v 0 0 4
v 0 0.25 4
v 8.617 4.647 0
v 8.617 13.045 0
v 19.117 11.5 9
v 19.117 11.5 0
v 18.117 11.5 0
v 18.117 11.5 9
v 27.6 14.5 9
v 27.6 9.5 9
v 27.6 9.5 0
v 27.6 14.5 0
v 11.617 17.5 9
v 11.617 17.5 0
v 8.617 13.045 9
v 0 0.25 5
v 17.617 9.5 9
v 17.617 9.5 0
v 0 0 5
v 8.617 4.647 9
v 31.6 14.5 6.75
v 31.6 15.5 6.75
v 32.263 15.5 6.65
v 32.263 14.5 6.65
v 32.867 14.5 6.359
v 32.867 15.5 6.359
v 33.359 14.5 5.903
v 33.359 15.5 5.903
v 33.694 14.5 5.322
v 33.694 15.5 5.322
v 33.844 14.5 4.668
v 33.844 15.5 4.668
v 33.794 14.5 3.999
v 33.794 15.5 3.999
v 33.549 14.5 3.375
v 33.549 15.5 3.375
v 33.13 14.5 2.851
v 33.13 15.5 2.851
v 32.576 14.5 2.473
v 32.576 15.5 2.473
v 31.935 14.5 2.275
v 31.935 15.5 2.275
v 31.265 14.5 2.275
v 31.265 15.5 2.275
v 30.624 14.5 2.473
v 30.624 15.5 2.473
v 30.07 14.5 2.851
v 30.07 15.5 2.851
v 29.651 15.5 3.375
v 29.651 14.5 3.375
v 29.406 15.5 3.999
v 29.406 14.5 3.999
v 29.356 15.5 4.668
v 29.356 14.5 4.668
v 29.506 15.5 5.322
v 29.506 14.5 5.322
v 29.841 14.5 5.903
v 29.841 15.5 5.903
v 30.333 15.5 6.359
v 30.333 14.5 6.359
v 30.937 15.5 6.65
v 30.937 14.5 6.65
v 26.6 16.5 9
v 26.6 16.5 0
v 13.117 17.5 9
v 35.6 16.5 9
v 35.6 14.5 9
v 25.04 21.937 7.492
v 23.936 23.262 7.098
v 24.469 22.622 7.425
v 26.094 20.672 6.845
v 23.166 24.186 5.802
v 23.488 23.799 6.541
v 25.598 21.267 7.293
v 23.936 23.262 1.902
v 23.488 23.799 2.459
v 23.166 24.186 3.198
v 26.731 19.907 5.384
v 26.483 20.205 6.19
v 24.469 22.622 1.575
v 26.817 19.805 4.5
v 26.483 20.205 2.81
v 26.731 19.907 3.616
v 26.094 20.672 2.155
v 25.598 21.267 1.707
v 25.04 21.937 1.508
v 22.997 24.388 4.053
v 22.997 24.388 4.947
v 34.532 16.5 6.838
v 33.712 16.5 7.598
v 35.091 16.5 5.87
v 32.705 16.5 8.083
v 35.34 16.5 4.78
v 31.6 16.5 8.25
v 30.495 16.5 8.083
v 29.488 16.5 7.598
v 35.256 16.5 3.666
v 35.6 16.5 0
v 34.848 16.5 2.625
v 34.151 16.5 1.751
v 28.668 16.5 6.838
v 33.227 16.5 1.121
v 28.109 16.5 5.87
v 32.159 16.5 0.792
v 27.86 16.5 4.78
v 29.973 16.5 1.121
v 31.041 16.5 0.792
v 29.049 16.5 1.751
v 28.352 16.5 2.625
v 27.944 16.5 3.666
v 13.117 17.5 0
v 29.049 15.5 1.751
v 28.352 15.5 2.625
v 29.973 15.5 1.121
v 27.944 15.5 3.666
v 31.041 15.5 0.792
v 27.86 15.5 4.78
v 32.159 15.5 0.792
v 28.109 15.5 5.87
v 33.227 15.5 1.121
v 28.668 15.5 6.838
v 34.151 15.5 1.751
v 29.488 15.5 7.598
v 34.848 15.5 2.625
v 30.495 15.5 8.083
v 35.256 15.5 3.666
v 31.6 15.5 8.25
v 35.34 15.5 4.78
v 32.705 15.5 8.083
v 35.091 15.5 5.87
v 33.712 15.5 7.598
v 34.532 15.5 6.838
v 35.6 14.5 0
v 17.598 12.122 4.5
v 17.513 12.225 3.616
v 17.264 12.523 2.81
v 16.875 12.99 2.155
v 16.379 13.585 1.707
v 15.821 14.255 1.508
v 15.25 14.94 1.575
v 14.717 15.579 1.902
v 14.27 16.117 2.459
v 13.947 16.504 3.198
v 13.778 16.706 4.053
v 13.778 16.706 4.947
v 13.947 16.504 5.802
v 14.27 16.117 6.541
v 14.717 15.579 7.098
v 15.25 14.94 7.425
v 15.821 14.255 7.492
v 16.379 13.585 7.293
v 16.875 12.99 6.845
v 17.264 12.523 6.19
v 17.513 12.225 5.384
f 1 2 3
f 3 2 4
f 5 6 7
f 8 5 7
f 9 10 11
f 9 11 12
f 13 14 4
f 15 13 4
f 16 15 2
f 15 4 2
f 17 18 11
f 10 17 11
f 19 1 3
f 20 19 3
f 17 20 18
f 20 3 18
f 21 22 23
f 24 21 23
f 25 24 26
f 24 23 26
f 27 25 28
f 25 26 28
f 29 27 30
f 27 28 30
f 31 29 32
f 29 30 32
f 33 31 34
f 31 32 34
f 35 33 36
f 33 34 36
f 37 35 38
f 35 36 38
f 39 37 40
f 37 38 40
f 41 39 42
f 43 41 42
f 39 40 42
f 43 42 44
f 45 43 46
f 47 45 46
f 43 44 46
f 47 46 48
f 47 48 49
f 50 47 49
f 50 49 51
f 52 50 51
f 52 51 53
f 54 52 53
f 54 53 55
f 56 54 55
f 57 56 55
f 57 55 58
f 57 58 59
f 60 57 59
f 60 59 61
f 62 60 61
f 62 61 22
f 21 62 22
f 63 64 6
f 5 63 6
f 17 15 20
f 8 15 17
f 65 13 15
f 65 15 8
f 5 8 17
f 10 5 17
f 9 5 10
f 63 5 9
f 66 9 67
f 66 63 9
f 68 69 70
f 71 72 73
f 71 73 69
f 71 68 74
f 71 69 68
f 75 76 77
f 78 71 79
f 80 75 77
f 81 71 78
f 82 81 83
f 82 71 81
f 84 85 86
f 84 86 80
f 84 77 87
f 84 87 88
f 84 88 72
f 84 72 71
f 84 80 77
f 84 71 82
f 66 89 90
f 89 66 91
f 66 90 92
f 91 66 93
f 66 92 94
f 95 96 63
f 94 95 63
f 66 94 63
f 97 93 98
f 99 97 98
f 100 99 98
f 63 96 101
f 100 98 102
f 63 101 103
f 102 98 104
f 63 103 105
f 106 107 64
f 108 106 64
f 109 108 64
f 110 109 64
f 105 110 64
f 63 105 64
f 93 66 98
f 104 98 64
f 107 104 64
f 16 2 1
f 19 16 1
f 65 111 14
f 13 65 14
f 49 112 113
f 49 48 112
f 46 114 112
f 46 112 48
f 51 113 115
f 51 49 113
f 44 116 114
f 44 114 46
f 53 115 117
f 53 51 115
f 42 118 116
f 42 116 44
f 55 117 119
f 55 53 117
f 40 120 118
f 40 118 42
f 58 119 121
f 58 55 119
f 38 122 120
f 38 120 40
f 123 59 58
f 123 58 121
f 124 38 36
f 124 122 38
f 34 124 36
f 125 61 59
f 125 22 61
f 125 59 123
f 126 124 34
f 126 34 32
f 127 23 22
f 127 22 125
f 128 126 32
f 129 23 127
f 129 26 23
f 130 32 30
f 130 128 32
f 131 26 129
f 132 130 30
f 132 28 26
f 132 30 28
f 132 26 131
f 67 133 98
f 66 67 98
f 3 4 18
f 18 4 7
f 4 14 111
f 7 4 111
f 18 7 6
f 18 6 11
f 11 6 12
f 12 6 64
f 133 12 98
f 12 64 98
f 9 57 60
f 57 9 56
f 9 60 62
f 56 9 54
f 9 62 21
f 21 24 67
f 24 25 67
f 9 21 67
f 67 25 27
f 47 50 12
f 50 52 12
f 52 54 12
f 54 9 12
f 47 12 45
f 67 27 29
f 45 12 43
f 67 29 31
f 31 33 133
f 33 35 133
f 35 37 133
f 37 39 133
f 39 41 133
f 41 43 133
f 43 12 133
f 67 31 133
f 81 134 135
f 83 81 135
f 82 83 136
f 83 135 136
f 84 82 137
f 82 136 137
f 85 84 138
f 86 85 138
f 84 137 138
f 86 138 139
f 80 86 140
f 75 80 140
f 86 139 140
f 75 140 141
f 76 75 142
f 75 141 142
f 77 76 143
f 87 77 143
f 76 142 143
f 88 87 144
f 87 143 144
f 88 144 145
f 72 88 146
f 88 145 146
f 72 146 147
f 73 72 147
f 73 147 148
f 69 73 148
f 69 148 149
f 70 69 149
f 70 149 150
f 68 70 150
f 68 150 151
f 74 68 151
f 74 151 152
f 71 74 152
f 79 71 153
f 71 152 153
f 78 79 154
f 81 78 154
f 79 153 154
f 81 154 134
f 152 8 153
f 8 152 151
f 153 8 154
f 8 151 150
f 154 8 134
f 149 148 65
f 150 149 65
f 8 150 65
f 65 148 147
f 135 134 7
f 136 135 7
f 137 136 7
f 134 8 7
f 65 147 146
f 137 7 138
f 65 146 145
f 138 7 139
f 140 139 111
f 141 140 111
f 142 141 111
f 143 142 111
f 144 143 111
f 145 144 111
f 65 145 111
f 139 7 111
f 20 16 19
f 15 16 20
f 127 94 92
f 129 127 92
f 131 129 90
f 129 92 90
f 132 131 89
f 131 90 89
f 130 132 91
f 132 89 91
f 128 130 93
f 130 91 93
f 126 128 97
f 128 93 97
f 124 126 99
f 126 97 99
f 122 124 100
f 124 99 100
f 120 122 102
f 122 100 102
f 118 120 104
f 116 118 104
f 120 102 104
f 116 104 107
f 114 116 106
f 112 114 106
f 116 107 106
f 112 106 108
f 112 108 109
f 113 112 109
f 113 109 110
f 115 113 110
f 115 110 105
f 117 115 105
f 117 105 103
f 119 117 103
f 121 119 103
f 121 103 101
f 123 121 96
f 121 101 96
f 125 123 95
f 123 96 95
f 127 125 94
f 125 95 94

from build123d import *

# Parameters (mm, degrees)
BOSS_EXTRUDE1_DEPTH = 9
SKETCH2_R           = 2.25
CUT_EXTRUDE1_DEPTH  = 16.5
SKETCH2_3_R         = 3.75
SKETCH2_3_R_2       = 2.25
CUT_EXTRUDE2_DEPTH  = 1
SKETCH3_R           = 3
BOSS_EXTRUDE2_DEPTH = 12


with BuildPart() as part:
    # Sketch1 → Boss-Extrude1 (new body)
    with BuildSketch(Plane.XY):
        Polygon((0, 0), (17.616685226, 9.5), (27.6, 9.5), (27.6, 14.5), (35.6, 14.5), (35.6, 16.5), (26.6, 16.5), (19.116685226, 11.5), (18.116685226, 11.5), (13.116685226, 17.5), (11.616685226, 17.5), (0, 0.25), align=None)
    extrude(amount=BOSS_EXTRUDE1_DEPTH)

    # Sketch2 → Cut-Extrude1 (cut)
    with BuildSketch(Plane(origin=(0, 16.5, 0), x_dir=(1, 0, 0), z_dir=(0, 1, 0))):
        with Locations(Location((31.6, -4.5, 0), (0, 0, 270))):
            Circle(SKETCH2_R)
        Polygon((0, 0), (0, -4), (8.616685226, 0), align=None)
        Polygon((0, -5), (8.616685226, -9), (0, -9), align=None)
    extrude(amount=-CUT_EXTRUDE1_DEPTH, mode=Mode.SUBTRACT)

    # Sketch2<3> → Cut-Extrude2 (cut)
    with BuildSketch(Plane(origin=(0, 16.5, 0), x_dir=(1, 0, 0), z_dir=(0, 1, 0))):
        with Locations(Location((31.6, -4.5, 0), (0, 0, 270))):
            Circle(SKETCH2_3_R)
        with Locations(Location((31.6, -4.5, 0), (0, 0, 270))):
            Circle(SKETCH2_3_R_2, mode=Mode.SUBTRACT)
    extrude(amount=-CUT_EXTRUDE2_DEPTH, mode=Mode.SUBTRACT)

    # Sketch3 → Boss-Extrude2 (add)
    with BuildSketch(Plane(origin=(16.347551937, 13.622959947, 0), x_dir=(0, 0, -1), z_dir=(0.768221279597376, 0.6401843996644799, 0))):
        with Locations(Location((-4.5, 1.046775136, 0), (0, 0, 270))):
            Circle(SKETCH3_R)
    extrude(amount=BOSS_EXTRUDE2_DEPTH)


solid = part.part
